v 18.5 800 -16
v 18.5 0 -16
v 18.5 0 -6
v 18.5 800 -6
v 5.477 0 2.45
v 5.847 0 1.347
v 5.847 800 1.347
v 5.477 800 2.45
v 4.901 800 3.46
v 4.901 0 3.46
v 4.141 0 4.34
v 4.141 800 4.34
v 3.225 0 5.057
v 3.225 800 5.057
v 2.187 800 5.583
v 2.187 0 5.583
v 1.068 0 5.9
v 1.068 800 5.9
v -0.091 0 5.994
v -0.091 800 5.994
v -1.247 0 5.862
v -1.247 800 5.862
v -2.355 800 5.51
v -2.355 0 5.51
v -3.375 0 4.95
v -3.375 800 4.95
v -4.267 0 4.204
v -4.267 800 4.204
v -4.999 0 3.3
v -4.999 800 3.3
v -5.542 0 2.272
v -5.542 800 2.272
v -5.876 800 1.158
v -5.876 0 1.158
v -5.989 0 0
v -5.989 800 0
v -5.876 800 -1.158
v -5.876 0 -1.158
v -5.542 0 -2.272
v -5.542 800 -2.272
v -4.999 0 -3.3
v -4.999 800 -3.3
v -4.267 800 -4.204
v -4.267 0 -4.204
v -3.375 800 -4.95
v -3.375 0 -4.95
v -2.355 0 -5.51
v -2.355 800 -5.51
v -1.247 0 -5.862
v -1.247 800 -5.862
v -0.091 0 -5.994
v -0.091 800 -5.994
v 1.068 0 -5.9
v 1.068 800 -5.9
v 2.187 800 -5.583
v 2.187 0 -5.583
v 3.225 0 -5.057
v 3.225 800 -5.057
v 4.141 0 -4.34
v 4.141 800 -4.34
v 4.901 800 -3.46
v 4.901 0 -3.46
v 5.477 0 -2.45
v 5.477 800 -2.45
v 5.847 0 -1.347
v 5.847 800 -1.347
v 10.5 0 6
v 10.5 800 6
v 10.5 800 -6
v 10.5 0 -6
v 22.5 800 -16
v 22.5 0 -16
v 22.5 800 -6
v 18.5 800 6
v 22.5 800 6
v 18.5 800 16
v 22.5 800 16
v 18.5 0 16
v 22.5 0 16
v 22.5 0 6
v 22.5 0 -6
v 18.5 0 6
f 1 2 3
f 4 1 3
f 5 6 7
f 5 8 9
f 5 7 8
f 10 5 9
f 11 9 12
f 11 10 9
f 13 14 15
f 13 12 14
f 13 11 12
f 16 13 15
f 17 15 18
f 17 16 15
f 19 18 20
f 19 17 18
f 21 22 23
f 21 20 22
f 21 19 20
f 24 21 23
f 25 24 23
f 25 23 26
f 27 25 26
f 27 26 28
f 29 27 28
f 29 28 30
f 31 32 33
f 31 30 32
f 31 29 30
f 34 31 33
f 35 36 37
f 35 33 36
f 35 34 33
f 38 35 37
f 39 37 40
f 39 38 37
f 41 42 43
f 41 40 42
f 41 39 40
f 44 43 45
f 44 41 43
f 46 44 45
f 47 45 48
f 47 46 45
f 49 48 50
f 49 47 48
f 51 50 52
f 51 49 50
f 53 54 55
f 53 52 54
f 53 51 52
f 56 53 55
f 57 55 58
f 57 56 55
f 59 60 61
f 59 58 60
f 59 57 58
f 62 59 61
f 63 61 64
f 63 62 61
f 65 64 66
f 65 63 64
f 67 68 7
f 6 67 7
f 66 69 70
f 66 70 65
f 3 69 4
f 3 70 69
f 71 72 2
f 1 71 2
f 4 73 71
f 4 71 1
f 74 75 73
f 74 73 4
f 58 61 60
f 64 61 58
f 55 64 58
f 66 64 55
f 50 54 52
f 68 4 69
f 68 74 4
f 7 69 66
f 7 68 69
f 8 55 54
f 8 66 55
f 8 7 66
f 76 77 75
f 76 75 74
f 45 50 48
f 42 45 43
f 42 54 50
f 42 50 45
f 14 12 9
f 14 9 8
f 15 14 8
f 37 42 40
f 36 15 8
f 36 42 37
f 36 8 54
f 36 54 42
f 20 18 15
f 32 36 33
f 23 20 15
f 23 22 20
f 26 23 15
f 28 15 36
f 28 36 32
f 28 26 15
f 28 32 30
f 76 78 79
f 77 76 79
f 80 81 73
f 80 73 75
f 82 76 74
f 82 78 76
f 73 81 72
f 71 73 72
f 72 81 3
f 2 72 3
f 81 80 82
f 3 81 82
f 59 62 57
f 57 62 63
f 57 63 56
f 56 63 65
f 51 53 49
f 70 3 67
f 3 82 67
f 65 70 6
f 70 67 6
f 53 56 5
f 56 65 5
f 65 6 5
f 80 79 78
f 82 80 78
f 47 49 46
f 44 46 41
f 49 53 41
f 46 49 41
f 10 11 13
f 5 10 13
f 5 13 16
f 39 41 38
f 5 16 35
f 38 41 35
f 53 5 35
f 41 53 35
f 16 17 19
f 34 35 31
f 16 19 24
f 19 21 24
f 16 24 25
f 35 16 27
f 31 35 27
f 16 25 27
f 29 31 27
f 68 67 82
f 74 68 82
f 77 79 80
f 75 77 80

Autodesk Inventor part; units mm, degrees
ref_plane "YZ Plane" through (0, 0, 0) normal (1, 0, 0) x (0, 1, 0)
ref_plane "XZ Plane" through (0, 0, 0) normal (0, 1, 0) x (-1, 0, 0)
ref_plane "XY Plane" through (0, 0, 0) normal (0, 0, 1) x (1, 0, 0)
sketch "Sketch1" plane through (0, 0, 0) normal (0, 1, 0) x (-1, 0, 0)
  line L0 (-22.5, -6) -> (-22.5, 6)
  line L1 (-10.5, -6) -> (-5.8469, -1.3469)
  line L2 (-10.5, -6) -> (-3.9195, -6) construction
  line L3 (-10.5, 6) -> (-5.8469, 1.3469)
  arc A0 (-5.8469, -1.3469) -> (-5.8469, 1.3469) centre (-0.0057, 0) ccw
  line L4 (-22.5, 16) -> (-22.5, -16)
  line L5 (-22.5, -16) -> (-18.5, -16)
  line L6 (-18.5, 16) -> (-22.5, 16)
  line L7 (-18.5, -16) -> (-18.5, -6)
  line L8 (-18.5, 16) -> (-18.5, 6)
  line L9 (-10.5, 6) -> (-18.5, 6)
  line L10 (-10.5, -6) -> (-18.5, -6)
  point P0 (0, 0)
  dimension "d2" = 12
  dimension "d3" = 45
  dimension "d4" = 12
  dimension "d6" = 5.9944
  dimension "d7" = 32
  dimension "d8" = 4
  dimension "d10" = 0
extrude "Extrusion1" add sketch "Sketch1" along normal blind 800
properties part number "supportedRail_SBR12_800mm"
